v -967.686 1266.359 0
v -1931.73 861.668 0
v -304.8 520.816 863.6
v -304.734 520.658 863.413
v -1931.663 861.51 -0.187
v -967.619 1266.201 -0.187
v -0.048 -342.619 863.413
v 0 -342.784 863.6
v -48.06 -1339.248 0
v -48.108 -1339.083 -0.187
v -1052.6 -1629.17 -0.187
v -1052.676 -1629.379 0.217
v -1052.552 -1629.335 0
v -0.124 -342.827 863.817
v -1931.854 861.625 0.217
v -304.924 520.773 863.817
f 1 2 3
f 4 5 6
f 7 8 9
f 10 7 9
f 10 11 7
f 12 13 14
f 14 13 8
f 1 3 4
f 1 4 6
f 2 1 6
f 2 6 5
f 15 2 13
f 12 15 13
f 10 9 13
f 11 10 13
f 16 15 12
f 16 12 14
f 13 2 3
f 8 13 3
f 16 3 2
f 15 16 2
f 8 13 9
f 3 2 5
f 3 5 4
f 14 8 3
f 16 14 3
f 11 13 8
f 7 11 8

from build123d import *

# Parameters (mm, degrees)
F8_DEPTH = 0.254
F9_DEPTH = 0.254


with BuildPart() as f8:
    # F5 (on face) → F8 (new body)
    with BuildSketch(Plane(origin=(-390.4862371513, -137.8186719357, 681.2388166237), x_dir=(0.8718292882, -0.0971238544, 0.4800840022), z_dir=(-0.4898098532, -0.1728740658, 0.8545179138))):
        Polygon((98.2832743903, 681.717228434), (-1767.8269736298, 844.5588062927), (-759.3983340631, -1596.9821495181), (447.8930020446, -164.7348011162), align=None)
    extrude(amount=F8_DEPTH)


with BuildPart() as f9:
    # F7 (on 3pt) → F9 (new body)
    with BuildSketch(Plane(origin=(160.9600035135, -557.3603890985, 634.1523561522), x_dir=(0.9823073787, 0.1236328561, -0.1406667365), z_dir=(-0.1872757695, 0.6484846762, -0.73783156))):
        Polygon((-212.7846547286, 1005.9369401883), (-1235.3688632138, 1223.8273830865), (-163.8591005336, -312.6463933659), align=None)
    extrude(amount=F9_DEPTH)


with BuildPart() as f10_1:
    # F10: instance of F9
    add(f9.part.mirror(Plane(origin=(-44.8187072543, 126.9863372204, 0), x_dir=(0.9429903336, 0.3328201177, 0), z_dir=(0.3328201177, -0.9429903336, 0))))


solid = Compound([f8.part, f9.part, f10_1.part])
